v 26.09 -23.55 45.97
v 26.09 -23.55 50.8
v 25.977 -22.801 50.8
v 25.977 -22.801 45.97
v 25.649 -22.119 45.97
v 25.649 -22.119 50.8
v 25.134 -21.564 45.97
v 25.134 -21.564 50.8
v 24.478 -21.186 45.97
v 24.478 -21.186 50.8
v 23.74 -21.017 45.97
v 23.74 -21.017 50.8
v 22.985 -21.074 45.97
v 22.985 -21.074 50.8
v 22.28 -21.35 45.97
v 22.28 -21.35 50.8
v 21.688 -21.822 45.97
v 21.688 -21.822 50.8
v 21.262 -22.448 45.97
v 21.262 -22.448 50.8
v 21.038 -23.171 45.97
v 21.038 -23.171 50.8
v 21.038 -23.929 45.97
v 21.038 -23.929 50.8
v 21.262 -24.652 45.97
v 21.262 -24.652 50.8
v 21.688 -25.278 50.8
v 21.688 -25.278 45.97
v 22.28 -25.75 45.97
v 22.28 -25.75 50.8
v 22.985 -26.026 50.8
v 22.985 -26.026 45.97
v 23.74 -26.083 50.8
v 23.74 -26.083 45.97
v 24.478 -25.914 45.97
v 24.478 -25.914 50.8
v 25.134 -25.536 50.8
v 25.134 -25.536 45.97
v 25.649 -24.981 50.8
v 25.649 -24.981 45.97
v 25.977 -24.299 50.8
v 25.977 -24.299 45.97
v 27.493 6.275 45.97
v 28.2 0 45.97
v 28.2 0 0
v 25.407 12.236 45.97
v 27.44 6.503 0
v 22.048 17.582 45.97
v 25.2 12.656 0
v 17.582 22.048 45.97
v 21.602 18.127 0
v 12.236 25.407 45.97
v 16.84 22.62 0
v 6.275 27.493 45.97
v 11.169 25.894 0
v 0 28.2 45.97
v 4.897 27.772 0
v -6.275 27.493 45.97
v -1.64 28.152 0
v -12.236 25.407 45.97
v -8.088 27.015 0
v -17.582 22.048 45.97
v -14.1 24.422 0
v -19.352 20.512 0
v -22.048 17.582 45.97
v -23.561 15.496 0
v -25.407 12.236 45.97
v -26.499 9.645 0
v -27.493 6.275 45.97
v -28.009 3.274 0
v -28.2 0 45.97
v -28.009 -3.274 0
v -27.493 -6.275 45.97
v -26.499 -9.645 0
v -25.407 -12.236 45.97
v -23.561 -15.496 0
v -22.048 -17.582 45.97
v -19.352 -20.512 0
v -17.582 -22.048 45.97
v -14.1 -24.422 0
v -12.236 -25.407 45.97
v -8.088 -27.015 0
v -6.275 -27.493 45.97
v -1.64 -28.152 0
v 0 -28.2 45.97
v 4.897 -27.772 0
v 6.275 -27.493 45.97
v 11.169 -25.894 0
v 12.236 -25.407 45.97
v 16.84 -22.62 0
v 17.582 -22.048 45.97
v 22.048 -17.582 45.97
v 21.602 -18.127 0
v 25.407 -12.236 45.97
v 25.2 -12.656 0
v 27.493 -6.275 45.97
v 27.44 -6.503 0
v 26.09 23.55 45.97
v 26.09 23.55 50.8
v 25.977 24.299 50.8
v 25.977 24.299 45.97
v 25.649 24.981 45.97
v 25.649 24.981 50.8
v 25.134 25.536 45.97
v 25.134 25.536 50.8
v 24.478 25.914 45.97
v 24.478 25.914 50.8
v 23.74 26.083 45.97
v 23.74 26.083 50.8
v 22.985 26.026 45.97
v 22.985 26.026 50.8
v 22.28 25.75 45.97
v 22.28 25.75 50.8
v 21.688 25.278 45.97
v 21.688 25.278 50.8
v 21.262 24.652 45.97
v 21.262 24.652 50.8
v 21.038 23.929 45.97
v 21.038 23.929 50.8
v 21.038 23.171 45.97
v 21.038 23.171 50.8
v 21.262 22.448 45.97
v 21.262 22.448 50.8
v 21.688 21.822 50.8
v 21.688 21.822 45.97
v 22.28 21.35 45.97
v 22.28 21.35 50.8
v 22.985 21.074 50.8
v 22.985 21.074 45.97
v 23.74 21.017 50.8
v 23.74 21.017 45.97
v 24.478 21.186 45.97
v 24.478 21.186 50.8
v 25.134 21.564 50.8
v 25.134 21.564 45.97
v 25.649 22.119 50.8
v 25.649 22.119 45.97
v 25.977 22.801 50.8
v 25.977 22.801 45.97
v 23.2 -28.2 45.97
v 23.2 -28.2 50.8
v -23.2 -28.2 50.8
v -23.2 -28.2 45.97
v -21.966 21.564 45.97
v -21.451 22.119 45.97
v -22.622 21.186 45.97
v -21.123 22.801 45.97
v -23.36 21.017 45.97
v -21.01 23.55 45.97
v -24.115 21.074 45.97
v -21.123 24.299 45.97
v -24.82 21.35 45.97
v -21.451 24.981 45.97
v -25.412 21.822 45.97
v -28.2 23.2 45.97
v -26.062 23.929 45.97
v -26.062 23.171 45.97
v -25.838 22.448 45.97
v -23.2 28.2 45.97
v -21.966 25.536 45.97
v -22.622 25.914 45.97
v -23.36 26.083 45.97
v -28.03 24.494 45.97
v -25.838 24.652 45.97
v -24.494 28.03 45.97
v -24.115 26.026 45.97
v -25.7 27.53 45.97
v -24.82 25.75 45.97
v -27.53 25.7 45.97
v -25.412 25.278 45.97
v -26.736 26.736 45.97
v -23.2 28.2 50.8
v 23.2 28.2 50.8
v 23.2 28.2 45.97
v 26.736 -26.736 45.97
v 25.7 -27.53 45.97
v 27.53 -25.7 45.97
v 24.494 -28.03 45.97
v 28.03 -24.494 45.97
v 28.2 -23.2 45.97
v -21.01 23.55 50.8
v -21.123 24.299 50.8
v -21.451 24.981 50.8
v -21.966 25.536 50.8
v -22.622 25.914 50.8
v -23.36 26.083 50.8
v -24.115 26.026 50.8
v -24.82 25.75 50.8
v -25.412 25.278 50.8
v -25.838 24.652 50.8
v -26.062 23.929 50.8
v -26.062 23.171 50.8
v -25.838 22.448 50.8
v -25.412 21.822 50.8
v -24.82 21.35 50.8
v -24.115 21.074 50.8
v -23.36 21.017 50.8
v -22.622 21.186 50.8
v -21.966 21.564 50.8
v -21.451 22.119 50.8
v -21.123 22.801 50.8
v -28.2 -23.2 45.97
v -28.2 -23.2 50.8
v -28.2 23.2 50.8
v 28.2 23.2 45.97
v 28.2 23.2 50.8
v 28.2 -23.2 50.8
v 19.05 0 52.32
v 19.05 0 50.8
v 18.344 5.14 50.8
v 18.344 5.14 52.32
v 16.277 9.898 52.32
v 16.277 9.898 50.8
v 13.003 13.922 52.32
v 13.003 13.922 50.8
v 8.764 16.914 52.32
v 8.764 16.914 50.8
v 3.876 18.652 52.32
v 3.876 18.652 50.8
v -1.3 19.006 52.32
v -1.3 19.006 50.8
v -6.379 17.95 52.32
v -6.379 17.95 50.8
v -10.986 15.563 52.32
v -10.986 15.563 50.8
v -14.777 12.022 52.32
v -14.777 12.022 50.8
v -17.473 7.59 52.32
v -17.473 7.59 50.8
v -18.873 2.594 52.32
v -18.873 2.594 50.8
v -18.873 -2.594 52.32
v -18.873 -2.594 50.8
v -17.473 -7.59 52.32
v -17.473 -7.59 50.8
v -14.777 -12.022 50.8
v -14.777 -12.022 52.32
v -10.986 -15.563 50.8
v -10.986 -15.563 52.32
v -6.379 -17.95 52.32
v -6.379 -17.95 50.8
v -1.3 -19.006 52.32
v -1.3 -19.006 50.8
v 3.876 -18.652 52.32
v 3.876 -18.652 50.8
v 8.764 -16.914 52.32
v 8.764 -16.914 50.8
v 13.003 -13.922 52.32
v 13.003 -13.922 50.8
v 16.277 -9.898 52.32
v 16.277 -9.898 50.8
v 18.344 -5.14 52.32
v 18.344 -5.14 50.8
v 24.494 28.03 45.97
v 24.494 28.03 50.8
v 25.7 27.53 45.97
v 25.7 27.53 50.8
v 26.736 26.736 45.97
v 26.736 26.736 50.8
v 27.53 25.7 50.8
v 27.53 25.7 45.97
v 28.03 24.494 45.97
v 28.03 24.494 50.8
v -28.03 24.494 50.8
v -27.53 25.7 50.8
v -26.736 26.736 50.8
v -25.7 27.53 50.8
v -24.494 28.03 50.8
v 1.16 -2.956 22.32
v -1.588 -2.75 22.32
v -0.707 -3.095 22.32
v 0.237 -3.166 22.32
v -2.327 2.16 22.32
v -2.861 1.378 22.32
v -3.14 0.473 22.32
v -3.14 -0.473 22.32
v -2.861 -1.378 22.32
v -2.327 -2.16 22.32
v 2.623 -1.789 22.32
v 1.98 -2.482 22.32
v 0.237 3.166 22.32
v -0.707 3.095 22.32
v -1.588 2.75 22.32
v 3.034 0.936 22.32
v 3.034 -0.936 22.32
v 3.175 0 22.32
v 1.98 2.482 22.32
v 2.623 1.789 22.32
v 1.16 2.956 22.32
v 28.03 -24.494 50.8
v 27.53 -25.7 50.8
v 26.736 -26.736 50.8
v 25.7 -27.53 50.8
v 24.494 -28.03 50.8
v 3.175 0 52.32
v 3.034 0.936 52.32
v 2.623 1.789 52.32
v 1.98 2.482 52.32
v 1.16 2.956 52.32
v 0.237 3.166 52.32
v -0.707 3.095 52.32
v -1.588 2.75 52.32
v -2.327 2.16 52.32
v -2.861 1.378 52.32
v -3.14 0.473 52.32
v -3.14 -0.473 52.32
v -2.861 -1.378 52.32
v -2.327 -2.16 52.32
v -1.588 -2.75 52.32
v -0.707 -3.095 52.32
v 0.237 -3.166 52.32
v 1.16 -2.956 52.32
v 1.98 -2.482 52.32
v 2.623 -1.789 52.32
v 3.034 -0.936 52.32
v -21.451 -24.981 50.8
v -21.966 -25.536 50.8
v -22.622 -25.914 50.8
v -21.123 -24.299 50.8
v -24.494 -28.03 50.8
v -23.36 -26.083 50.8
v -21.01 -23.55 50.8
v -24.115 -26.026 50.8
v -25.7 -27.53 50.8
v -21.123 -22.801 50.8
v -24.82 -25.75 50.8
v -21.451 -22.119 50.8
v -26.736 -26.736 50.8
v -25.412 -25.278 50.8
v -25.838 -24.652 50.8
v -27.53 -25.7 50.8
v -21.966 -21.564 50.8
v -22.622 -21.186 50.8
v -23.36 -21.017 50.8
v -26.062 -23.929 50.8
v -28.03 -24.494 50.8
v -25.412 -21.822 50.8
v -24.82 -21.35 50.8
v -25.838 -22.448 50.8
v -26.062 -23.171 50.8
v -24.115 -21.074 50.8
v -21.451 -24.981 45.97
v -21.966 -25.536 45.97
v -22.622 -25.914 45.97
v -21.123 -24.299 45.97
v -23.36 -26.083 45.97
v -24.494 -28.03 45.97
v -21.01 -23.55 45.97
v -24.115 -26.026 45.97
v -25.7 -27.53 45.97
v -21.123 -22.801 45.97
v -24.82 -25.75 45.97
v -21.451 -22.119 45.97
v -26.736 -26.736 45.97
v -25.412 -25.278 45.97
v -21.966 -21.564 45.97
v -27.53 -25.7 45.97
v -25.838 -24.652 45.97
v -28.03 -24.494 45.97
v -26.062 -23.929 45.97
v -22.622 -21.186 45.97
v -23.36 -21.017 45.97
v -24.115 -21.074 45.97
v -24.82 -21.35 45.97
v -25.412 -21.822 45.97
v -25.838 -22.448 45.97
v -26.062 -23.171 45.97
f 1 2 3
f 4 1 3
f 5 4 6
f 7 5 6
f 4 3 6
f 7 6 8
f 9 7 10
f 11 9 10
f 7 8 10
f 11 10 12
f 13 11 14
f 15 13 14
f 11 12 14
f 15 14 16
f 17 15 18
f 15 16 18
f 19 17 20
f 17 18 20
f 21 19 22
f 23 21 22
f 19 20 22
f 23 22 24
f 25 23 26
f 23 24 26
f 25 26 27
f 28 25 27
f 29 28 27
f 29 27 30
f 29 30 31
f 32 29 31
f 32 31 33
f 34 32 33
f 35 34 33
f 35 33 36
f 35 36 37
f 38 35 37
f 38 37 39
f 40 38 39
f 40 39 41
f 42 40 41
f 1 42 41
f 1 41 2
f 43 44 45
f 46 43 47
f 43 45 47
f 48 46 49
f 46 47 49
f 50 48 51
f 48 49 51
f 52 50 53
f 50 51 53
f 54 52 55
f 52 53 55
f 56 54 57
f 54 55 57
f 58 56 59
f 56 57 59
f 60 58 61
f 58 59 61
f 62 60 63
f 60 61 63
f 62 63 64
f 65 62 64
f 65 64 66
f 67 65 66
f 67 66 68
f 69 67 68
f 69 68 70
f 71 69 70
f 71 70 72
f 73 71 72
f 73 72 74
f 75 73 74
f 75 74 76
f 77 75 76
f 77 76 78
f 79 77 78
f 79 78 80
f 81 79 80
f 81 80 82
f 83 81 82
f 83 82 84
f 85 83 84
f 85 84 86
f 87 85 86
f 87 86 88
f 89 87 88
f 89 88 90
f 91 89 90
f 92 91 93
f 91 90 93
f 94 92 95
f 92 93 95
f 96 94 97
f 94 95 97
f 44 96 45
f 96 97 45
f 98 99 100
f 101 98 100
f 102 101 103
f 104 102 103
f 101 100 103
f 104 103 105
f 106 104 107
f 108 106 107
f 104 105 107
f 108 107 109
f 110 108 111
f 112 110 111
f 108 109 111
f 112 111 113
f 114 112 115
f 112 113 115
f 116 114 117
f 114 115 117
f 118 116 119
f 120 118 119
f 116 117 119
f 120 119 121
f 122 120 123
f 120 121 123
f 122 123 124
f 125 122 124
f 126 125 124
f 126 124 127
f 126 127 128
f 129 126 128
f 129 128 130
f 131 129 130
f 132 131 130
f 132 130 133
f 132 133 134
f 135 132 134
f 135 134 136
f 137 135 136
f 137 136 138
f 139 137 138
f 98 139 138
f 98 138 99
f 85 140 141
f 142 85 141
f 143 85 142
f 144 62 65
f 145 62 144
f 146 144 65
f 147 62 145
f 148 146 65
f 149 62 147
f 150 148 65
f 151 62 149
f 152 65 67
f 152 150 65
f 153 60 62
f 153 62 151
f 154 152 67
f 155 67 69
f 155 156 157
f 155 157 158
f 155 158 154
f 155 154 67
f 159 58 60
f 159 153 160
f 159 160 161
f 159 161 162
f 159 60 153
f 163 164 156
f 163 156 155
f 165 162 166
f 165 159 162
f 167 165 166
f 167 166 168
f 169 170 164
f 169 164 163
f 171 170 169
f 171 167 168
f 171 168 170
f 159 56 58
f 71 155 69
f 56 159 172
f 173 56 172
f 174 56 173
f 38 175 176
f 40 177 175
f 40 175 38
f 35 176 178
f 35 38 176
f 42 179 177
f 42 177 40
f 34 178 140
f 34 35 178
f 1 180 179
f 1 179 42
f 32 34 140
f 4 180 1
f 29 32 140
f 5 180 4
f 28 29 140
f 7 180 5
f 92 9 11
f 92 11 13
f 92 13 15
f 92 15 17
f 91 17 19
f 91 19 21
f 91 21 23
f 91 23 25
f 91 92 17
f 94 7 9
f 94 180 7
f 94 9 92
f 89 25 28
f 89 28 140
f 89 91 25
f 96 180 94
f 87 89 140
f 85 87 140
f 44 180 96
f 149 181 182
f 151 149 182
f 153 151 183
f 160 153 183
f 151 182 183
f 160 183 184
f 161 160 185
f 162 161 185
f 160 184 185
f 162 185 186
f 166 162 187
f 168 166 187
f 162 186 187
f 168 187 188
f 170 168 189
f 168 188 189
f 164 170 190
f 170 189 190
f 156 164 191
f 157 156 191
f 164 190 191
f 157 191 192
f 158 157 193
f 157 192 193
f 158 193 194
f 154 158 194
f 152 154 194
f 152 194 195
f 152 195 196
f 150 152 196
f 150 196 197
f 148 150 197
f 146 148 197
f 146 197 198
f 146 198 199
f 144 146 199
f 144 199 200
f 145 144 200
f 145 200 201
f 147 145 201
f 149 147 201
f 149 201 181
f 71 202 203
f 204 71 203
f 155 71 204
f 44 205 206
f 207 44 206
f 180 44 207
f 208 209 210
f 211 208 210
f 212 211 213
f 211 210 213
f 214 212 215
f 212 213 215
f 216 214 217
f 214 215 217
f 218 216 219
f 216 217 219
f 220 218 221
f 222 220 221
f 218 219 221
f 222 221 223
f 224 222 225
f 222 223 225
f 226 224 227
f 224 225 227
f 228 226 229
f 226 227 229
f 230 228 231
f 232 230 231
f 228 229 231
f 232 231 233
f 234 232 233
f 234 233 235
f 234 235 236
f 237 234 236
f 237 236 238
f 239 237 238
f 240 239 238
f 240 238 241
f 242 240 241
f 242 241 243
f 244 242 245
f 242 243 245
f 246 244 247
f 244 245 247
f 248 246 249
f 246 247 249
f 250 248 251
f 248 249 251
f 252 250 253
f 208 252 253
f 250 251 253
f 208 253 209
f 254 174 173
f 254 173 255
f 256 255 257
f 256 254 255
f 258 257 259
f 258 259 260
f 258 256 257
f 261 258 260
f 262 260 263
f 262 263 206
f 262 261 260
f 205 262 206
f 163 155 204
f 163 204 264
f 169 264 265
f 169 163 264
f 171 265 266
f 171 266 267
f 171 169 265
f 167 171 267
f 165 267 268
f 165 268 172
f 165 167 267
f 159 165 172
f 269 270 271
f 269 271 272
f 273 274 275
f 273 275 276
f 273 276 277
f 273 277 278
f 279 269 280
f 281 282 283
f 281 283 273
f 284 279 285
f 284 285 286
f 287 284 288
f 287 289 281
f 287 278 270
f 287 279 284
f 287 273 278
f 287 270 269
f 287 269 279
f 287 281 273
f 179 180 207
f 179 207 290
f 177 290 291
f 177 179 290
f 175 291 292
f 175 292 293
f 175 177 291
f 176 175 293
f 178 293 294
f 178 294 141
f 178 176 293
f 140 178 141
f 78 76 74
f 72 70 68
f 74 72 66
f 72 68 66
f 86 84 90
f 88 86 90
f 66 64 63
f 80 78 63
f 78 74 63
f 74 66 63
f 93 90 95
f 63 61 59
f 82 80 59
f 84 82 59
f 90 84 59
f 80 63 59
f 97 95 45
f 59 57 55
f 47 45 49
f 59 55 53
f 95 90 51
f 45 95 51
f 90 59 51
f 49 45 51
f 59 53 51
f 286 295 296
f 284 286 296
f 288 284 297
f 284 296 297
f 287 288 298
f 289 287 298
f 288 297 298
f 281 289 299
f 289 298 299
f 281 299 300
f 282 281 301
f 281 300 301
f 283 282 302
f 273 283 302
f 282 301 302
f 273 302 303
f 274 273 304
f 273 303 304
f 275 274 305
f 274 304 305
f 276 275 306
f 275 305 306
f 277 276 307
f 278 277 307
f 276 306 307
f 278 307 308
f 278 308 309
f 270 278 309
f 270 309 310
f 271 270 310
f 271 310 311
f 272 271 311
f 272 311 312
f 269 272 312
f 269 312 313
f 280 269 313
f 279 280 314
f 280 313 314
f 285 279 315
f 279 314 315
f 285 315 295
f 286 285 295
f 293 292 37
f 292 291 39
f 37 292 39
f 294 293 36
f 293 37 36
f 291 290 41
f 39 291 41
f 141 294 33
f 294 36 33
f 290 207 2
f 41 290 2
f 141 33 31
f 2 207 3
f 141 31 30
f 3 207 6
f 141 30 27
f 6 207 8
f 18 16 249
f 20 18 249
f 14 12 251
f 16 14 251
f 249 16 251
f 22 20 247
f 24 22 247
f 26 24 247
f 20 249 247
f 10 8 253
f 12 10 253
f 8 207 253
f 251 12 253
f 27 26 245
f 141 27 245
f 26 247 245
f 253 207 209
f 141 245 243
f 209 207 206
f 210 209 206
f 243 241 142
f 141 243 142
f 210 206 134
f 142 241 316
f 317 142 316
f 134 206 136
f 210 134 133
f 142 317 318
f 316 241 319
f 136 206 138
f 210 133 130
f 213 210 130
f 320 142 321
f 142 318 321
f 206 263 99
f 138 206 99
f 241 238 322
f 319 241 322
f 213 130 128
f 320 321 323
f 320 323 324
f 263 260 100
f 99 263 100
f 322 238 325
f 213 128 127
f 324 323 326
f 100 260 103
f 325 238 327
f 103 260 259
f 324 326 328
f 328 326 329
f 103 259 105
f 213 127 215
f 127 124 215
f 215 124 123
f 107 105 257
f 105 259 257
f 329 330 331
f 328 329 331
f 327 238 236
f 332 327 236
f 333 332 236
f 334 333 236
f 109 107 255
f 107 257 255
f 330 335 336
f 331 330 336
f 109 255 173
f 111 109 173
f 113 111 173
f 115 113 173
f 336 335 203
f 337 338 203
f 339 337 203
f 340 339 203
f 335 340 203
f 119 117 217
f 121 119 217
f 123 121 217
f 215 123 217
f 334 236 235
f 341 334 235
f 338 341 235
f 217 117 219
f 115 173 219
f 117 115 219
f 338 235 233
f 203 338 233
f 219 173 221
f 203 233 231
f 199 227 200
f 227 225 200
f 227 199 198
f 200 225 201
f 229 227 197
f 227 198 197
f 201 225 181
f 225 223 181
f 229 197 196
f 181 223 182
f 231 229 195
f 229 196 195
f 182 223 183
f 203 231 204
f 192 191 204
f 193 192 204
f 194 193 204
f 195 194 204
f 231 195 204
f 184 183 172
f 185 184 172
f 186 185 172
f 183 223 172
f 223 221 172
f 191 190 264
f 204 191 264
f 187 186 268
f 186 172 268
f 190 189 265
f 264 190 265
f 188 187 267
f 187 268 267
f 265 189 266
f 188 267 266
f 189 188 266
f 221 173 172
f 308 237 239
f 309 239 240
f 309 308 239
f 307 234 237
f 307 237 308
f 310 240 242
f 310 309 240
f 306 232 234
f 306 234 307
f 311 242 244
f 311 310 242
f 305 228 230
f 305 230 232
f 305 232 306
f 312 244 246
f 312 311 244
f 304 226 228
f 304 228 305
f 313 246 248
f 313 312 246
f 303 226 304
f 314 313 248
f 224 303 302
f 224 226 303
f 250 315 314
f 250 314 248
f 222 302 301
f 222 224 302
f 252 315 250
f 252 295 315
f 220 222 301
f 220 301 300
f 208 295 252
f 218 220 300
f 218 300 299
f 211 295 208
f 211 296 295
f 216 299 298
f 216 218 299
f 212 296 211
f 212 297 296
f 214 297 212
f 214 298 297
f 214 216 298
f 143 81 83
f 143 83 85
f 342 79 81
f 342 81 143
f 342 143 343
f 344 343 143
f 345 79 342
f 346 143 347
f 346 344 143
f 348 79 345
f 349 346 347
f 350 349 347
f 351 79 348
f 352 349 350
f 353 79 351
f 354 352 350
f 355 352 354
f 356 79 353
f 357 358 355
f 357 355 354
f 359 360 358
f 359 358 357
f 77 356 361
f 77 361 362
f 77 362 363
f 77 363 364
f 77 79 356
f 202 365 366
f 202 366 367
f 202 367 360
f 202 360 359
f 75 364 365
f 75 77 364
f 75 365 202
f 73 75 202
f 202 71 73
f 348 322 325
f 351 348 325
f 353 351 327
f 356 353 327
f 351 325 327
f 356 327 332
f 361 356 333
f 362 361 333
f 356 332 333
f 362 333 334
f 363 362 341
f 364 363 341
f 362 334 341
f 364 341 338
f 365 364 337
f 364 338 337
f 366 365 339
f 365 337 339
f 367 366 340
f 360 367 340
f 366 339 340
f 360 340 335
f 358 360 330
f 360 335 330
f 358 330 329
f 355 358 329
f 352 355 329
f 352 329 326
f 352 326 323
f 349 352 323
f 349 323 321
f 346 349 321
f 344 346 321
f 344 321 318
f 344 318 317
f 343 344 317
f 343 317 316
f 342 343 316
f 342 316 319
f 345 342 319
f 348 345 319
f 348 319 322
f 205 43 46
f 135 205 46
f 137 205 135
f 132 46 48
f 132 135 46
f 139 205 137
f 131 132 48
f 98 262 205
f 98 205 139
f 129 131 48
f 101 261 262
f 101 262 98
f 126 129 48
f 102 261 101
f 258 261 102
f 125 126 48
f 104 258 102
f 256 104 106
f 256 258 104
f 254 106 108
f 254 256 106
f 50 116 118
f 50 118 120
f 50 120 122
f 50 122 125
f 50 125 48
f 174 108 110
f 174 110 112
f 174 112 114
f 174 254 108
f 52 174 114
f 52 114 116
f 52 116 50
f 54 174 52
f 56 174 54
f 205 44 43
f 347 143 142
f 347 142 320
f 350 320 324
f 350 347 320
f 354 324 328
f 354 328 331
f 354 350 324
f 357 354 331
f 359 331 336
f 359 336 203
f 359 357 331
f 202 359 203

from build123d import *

# Parameters (mm, degrees)
ESQUISSE1_R                     = 28.2
BASE_EXTRUSION_DEPTH            = 45.97
BOSS_EXTRU_1_DEPTH              = 4.83
ESQUISSE3_R                     = 19.05
BOSS_EXTRU_2_DEPTH              = 1.52
ESQUISSE4_R                     = 2.54
ENL_V_MAT_EXTRU_1_DEPTH         = 65.584208596
ESQUISSE5_R                     = 3.175
ENL_V_MAT_EXTRU_2_DEPTH         = 30
R_P_TITION_LIN_AIRE1_COUNT      = 2
R_P_TITION_LIN_AIRE1_PITCH      = 47.1
R_P_TITION_LIN_AIRE1_COUNT_DIR2 = 2
R_P_TITION_LIN_AIRE1_PITCH_DIR2 = 47.1


with BuildPart() as part:
    # Esquisse1 → Base-Extrusion (new body)
    with BuildSketch(Plane.XY):
        Circle(ESQUISSE1_R)
    extrude(amount=BASE_EXTRUSION_DEPTH)

    # Esquisse2 → Boss.-Extru.1 (add)
    with BuildSketch(Plane.XY.offset(45.97)):
        with BuildLine():
            Line((-23.2, 28.2), (23.2, 28.2))
            ThreePointArc((23.2, 28.2), (26.735533906, 26.735533906), (28.2, 23.2))
            Line((28.2, 23.2), (28.2, -23.2))
            ThreePointArc((28.2, -23.2), (26.735533906, -26.735533906), (23.2, -28.2))
            Line((23.2, -28.2), (-23.2, -28.2))
            ThreePointArc((-23.2, -28.2), (-26.735533906, -26.735533906), (-28.2, -23.2))
            Line((-28.2, -23.2), (-28.2, 23.2))
            ThreePointArc((-28.2, 23.2), (-26.735533906, 26.735533906), (-23.2, 28.2))
        make_face()
    extrude(amount=BOSS_EXTRU_1_DEPTH)

    # Esquisse3 → Boss.-Extru.2 (add)
    with BuildSketch(Plane.XY.offset(50.8)):
        Circle(ESQUISSE3_R)
    extrude(amount=BOSS_EXTRU_2_DEPTH)

    # Esquisse4 → Enlèv. mat.-Extru.1 (cut, through all)
    with BuildSketch(Plane.XY.offset(50.8)):
        with Locations((-23.55, 23.55)):
            Circle(ESQUISSE4_R)
    enl_v_mat_extru_1 = extrude(amount=-ENL_V_MAT_EXTRU_1_DEPTH, mode=Mode.SUBTRACT)

    # Esquisse5 → Enlèv. mat.-Extru.2 (cut)
    with BuildSketch(Plane.XY.offset(52.32)):
        Circle(ESQUISSE5_R)
    extrude(amount=-ENL_V_MAT_EXTRU_2_DEPTH, mode=Mode.SUBTRACT)

    # Répétition linéaire1: Enl_v. mat.-Extru.1 2 × 2
    with Locations(*[(i * R_P_TITION_LIN_AIRE1_PITCH, -j * R_P_TITION_LIN_AIRE1_PITCH_DIR2, 0) for i in range(R_P_TITION_LIN_AIRE1_COUNT) for j in range(R_P_TITION_LIN_AIRE1_COUNT_DIR2) if (i, j) != (0, 0)]):
        add(enl_v_mat_extru_1, mode=Mode.SUBTRACT)


solid = part.part
